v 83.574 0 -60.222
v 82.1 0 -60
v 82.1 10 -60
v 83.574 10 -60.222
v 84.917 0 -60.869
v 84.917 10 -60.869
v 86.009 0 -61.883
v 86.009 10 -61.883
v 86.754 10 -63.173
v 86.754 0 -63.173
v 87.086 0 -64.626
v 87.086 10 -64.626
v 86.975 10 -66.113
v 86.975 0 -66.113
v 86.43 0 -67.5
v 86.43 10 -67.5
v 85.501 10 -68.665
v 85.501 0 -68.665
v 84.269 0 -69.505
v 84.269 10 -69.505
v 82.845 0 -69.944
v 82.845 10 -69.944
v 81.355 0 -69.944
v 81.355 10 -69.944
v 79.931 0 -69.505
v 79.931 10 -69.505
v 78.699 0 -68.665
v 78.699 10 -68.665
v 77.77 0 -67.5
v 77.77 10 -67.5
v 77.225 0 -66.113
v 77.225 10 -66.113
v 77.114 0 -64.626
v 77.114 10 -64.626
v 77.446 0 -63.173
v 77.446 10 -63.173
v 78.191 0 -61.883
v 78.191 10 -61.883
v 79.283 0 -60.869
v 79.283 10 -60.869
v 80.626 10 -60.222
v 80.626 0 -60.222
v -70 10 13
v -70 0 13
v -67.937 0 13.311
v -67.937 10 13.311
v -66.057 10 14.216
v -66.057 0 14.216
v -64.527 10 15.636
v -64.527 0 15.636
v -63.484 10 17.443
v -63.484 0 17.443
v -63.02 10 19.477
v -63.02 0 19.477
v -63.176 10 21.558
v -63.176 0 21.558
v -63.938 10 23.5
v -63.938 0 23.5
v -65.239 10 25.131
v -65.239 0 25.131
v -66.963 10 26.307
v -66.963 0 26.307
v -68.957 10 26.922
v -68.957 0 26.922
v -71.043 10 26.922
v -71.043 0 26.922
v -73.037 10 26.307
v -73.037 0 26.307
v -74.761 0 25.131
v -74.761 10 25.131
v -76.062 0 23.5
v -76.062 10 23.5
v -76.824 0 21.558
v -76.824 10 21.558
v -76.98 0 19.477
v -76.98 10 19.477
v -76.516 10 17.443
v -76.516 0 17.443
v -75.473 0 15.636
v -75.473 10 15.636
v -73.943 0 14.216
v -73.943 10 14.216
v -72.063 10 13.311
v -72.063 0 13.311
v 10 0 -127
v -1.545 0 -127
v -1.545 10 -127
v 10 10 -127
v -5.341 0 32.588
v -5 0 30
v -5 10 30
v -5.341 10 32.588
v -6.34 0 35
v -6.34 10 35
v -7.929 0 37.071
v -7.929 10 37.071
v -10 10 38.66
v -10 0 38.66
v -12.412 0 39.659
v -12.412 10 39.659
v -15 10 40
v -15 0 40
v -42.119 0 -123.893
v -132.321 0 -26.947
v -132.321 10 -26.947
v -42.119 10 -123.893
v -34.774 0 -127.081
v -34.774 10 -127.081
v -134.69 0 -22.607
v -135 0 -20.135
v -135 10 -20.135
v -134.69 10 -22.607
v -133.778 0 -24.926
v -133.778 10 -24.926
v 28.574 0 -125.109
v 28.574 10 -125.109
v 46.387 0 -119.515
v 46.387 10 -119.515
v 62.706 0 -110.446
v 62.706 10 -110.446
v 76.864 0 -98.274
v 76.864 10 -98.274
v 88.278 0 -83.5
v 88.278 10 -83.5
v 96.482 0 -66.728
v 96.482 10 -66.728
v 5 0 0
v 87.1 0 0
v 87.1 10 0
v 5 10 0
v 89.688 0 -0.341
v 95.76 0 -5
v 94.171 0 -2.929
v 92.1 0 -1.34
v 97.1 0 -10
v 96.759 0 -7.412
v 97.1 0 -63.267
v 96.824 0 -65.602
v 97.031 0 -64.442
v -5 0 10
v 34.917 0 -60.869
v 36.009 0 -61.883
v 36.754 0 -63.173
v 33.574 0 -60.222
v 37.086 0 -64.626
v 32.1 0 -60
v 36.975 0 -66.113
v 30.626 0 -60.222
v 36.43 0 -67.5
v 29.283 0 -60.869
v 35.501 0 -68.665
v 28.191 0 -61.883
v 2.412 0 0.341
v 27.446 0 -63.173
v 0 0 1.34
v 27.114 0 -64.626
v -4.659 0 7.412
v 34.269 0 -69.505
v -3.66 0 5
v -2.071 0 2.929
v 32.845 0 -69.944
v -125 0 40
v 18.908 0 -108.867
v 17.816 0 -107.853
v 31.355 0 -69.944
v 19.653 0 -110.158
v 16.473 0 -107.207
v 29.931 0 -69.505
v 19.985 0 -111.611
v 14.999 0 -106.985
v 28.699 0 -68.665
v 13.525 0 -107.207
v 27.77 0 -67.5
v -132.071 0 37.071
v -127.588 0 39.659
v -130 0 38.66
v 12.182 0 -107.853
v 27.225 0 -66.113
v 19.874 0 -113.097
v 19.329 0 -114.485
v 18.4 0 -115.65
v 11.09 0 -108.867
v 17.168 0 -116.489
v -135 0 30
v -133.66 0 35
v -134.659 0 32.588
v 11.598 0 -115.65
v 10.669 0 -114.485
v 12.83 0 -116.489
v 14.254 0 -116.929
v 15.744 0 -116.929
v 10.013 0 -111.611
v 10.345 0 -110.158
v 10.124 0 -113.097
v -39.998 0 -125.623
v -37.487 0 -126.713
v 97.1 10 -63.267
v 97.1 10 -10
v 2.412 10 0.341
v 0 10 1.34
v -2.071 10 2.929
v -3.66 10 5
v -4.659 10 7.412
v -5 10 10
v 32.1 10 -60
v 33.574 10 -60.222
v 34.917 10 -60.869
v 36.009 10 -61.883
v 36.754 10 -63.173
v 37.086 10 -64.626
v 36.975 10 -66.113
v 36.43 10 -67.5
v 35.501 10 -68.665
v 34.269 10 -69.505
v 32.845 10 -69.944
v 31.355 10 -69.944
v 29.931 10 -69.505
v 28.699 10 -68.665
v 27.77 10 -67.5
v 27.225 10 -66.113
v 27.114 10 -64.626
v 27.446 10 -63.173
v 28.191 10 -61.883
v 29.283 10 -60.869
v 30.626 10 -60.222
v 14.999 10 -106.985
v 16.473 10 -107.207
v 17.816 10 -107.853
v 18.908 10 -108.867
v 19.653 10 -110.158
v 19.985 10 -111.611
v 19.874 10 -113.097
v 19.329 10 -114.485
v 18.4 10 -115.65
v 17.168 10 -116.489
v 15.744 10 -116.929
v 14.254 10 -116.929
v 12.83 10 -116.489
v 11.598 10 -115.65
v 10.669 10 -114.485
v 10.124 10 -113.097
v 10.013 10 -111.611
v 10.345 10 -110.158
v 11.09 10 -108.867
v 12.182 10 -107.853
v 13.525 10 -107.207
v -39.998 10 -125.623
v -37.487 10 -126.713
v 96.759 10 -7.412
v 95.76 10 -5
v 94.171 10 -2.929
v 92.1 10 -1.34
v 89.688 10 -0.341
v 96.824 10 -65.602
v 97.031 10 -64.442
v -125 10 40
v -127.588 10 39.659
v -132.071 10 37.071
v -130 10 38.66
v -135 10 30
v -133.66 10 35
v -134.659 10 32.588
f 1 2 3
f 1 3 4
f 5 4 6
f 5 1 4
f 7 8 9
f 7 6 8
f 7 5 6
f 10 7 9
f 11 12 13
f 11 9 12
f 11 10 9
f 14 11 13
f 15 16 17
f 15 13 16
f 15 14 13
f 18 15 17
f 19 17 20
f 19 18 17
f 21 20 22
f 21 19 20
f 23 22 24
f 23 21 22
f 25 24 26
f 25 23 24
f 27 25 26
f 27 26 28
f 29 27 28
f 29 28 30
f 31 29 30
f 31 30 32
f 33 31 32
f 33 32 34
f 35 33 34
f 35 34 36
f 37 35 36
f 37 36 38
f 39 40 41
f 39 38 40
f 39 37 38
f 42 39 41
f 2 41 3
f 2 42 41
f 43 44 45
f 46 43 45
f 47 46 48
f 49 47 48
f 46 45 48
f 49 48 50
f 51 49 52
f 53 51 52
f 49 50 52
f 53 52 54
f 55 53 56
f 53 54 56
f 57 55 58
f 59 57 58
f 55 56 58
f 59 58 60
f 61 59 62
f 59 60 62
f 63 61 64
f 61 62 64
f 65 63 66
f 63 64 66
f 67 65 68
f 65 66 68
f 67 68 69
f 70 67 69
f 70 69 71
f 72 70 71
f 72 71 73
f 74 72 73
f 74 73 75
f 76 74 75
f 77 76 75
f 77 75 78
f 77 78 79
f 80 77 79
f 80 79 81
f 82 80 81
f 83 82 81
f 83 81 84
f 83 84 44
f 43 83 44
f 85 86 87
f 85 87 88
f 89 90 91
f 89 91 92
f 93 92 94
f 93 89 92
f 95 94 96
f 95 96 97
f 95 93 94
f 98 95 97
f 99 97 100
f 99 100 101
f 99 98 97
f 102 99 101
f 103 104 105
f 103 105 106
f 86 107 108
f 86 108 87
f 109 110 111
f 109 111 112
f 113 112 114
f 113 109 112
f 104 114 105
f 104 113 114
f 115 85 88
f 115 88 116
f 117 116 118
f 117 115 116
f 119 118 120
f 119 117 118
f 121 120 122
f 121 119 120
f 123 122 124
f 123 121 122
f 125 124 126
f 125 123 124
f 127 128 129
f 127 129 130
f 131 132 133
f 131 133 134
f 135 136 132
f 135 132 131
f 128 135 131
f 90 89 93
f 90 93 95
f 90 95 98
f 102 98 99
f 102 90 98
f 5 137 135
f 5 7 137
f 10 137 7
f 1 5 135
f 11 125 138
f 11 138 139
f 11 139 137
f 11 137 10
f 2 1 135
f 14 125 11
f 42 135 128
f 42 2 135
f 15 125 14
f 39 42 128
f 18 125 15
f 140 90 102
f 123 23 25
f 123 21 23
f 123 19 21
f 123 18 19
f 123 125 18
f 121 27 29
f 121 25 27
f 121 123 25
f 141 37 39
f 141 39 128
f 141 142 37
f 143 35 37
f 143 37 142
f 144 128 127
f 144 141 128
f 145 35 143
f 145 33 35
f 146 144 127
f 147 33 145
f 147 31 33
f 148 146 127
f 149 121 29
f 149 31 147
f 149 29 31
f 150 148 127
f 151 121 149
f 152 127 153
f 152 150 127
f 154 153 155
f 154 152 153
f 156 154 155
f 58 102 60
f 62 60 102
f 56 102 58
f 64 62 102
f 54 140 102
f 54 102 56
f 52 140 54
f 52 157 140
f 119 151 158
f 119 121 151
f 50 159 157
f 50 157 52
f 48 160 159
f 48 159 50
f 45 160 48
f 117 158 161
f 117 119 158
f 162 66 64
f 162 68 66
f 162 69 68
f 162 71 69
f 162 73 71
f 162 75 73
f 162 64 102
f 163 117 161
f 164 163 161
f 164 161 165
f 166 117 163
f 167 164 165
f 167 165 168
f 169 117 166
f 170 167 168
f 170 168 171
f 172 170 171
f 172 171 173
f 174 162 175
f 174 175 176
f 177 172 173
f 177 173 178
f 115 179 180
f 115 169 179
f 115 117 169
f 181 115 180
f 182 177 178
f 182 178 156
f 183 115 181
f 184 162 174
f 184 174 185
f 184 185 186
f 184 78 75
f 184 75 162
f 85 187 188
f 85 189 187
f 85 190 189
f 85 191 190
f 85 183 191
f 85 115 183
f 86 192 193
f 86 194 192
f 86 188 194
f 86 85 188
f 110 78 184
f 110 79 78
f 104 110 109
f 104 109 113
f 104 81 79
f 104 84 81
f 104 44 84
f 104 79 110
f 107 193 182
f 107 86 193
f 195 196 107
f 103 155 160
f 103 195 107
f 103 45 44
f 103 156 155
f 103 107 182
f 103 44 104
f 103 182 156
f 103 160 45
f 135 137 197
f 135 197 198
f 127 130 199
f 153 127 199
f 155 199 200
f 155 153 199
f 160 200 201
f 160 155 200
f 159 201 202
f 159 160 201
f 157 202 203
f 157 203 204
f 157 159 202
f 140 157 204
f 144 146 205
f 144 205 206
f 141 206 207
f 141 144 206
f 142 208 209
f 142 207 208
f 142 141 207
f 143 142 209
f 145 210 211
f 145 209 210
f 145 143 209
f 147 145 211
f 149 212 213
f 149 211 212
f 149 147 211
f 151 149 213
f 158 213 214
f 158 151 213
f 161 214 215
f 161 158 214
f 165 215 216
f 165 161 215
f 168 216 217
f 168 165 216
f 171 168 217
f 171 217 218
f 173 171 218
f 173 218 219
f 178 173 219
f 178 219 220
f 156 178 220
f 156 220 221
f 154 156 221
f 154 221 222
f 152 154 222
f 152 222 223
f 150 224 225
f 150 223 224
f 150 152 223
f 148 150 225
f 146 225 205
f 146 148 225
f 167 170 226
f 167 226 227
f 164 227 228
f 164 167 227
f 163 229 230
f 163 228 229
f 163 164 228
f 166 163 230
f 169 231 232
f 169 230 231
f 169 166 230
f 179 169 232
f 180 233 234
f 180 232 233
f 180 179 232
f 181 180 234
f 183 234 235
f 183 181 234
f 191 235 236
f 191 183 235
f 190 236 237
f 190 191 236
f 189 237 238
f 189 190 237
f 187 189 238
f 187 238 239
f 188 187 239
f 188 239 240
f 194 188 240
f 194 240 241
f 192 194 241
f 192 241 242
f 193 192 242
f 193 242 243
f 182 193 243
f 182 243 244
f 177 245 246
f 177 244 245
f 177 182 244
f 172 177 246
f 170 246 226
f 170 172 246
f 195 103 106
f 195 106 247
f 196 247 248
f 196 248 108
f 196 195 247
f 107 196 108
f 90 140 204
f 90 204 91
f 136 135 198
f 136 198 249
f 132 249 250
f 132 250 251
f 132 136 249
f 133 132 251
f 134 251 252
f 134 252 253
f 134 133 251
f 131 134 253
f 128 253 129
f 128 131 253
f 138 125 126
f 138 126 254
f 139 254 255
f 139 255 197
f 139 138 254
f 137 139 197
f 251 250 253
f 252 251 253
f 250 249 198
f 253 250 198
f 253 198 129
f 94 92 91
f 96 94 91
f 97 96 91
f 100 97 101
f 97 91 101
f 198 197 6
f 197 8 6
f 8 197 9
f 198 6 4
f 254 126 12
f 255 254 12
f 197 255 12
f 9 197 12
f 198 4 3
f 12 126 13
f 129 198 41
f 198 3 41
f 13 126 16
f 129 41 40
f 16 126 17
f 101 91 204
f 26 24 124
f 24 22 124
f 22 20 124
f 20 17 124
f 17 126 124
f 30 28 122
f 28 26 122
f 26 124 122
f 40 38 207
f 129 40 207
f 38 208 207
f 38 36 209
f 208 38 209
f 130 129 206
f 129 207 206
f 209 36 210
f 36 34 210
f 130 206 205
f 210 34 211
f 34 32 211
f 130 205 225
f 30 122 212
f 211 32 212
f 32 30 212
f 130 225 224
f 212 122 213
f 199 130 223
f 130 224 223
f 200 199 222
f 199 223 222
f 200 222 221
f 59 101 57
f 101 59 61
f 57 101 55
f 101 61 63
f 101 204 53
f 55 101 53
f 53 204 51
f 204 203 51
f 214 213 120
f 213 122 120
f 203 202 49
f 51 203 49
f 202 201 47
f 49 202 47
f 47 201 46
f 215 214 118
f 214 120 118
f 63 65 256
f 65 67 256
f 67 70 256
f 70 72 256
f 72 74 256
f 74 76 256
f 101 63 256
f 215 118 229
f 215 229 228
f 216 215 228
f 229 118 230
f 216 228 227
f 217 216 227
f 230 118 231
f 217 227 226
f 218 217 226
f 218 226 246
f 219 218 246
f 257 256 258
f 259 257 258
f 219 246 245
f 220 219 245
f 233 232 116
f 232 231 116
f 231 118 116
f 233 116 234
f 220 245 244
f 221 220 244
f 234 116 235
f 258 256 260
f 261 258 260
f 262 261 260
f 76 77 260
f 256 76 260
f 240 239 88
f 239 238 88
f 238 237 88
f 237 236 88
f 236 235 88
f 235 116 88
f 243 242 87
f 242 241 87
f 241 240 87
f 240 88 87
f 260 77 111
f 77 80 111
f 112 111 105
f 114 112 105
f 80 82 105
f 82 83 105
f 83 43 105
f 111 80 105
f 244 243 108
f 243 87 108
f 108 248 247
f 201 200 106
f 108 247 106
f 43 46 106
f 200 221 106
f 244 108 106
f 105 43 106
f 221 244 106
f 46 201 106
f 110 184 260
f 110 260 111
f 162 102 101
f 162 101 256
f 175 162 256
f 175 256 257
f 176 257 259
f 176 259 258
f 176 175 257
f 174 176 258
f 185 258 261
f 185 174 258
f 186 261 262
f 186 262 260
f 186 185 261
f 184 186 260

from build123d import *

# Parameters (mm, degrees)
BOSS_EXTRUDE1_DEPTH     = 10
CUT_EXTRUDE4_DEPTH      = 186.673146884
CUT_EXTRUDE4_DEPTH_BACK = 186.673146884
SKETCH2_R               = 5
SKETCH3_R               = 7
CUT_EXTRUDE5_DEPTH      = 186.673146884


with BuildPart() as part:
    # Sketch1 → Boss-Extrude1 (new body)
    with BuildSketch(Plane(origin=(0, 0, 0), x_dir=(1, 0, 0), z_dir=(0, 1, 0))):
        with BuildLine():
            Line((-1.545174458, 127), (10, 127))
            ThreePointArc((10, 127), (62.706174301, 110.445628071), (96.481761872, 66.728380632))
            ThreePointArc((96.481761872, 66.728380632), (96.94422721, 65.024977681), (97.1, 63.266799465))
            Line((97.1, 63.266799465), (97.1, 10))
            ThreePointArc((97.1, 10), (94.171067812, 2.928932188), (87.1, 0))
            Line((87.1, 0), (5, 0))
            ThreePointArc((5, 0), (-2.071067812, -2.928932188), (-5, -10))
            Line((-5, -10), (-5, -30))
            ThreePointArc((-5, -30), (-7.928932188, -37.071067812), (-15, -40))
            Line((-15, -40), (-125, -40))
            ThreePointArc((-125, -40), (-132.071067812, -37.071067812), (-135, -30))
            Line((-135, -30), (-135, 20.135444575))
            ThreePointArc((-135, 20.135444575), (-134.306211211, 23.795285131), (-132.321113421, 26.947294417))
            Line((-132.321113421, 26.947294417), (-42.119413536, 123.892601626))
            ThreePointArc((-42.119413536, 123.892601626), (-38.77974787, 126.253977703), (-34.774007346, 127.080722276))
            Line((-34.774007346, 127.080722276), (-1.545174458, 127))
        make_face()
    extrude(amount=BOSS_EXTRUDE1_DEPTH)

    # Sketch2 → Cut-Extrude4 (cut, two sides: drawn at the far end of the back side and taken through both)
    with BuildSketch(Plane(origin=(0, 0, 0), x_dir=(1, 0, 0), z_dir=(0, 1, 0)).offset(-CUT_EXTRUDE4_DEPTH_BACK)):
        with Locations(Location((14.998992834, 111.984631039, 0), (0, 0, 270))):
            Circle(SKETCH2_R)
        with Locations(Location((82.1, 65, 0), (0, 0, 270))):
            Circle(SKETCH2_R)
        with Locations(Location((32.1, 65, 0), (0, 0, 270))):
            Circle(SKETCH2_R)
    extrude(amount=CUT_EXTRUDE4_DEPTH + CUT_EXTRUDE4_DEPTH_BACK, mode=Mode.SUBTRACT)

    # Sketch3 → Cut-Extrude5 (cut, through all)
    with BuildSketch(Plane.XZ):
        with Locations(Location((-70, 20, 0), (0, 0, 270))):
            Circle(SKETCH3_R)
    extrude(amount=-CUT_EXTRUDE5_DEPTH, mode=Mode.SUBTRACT)


solid = part.part
